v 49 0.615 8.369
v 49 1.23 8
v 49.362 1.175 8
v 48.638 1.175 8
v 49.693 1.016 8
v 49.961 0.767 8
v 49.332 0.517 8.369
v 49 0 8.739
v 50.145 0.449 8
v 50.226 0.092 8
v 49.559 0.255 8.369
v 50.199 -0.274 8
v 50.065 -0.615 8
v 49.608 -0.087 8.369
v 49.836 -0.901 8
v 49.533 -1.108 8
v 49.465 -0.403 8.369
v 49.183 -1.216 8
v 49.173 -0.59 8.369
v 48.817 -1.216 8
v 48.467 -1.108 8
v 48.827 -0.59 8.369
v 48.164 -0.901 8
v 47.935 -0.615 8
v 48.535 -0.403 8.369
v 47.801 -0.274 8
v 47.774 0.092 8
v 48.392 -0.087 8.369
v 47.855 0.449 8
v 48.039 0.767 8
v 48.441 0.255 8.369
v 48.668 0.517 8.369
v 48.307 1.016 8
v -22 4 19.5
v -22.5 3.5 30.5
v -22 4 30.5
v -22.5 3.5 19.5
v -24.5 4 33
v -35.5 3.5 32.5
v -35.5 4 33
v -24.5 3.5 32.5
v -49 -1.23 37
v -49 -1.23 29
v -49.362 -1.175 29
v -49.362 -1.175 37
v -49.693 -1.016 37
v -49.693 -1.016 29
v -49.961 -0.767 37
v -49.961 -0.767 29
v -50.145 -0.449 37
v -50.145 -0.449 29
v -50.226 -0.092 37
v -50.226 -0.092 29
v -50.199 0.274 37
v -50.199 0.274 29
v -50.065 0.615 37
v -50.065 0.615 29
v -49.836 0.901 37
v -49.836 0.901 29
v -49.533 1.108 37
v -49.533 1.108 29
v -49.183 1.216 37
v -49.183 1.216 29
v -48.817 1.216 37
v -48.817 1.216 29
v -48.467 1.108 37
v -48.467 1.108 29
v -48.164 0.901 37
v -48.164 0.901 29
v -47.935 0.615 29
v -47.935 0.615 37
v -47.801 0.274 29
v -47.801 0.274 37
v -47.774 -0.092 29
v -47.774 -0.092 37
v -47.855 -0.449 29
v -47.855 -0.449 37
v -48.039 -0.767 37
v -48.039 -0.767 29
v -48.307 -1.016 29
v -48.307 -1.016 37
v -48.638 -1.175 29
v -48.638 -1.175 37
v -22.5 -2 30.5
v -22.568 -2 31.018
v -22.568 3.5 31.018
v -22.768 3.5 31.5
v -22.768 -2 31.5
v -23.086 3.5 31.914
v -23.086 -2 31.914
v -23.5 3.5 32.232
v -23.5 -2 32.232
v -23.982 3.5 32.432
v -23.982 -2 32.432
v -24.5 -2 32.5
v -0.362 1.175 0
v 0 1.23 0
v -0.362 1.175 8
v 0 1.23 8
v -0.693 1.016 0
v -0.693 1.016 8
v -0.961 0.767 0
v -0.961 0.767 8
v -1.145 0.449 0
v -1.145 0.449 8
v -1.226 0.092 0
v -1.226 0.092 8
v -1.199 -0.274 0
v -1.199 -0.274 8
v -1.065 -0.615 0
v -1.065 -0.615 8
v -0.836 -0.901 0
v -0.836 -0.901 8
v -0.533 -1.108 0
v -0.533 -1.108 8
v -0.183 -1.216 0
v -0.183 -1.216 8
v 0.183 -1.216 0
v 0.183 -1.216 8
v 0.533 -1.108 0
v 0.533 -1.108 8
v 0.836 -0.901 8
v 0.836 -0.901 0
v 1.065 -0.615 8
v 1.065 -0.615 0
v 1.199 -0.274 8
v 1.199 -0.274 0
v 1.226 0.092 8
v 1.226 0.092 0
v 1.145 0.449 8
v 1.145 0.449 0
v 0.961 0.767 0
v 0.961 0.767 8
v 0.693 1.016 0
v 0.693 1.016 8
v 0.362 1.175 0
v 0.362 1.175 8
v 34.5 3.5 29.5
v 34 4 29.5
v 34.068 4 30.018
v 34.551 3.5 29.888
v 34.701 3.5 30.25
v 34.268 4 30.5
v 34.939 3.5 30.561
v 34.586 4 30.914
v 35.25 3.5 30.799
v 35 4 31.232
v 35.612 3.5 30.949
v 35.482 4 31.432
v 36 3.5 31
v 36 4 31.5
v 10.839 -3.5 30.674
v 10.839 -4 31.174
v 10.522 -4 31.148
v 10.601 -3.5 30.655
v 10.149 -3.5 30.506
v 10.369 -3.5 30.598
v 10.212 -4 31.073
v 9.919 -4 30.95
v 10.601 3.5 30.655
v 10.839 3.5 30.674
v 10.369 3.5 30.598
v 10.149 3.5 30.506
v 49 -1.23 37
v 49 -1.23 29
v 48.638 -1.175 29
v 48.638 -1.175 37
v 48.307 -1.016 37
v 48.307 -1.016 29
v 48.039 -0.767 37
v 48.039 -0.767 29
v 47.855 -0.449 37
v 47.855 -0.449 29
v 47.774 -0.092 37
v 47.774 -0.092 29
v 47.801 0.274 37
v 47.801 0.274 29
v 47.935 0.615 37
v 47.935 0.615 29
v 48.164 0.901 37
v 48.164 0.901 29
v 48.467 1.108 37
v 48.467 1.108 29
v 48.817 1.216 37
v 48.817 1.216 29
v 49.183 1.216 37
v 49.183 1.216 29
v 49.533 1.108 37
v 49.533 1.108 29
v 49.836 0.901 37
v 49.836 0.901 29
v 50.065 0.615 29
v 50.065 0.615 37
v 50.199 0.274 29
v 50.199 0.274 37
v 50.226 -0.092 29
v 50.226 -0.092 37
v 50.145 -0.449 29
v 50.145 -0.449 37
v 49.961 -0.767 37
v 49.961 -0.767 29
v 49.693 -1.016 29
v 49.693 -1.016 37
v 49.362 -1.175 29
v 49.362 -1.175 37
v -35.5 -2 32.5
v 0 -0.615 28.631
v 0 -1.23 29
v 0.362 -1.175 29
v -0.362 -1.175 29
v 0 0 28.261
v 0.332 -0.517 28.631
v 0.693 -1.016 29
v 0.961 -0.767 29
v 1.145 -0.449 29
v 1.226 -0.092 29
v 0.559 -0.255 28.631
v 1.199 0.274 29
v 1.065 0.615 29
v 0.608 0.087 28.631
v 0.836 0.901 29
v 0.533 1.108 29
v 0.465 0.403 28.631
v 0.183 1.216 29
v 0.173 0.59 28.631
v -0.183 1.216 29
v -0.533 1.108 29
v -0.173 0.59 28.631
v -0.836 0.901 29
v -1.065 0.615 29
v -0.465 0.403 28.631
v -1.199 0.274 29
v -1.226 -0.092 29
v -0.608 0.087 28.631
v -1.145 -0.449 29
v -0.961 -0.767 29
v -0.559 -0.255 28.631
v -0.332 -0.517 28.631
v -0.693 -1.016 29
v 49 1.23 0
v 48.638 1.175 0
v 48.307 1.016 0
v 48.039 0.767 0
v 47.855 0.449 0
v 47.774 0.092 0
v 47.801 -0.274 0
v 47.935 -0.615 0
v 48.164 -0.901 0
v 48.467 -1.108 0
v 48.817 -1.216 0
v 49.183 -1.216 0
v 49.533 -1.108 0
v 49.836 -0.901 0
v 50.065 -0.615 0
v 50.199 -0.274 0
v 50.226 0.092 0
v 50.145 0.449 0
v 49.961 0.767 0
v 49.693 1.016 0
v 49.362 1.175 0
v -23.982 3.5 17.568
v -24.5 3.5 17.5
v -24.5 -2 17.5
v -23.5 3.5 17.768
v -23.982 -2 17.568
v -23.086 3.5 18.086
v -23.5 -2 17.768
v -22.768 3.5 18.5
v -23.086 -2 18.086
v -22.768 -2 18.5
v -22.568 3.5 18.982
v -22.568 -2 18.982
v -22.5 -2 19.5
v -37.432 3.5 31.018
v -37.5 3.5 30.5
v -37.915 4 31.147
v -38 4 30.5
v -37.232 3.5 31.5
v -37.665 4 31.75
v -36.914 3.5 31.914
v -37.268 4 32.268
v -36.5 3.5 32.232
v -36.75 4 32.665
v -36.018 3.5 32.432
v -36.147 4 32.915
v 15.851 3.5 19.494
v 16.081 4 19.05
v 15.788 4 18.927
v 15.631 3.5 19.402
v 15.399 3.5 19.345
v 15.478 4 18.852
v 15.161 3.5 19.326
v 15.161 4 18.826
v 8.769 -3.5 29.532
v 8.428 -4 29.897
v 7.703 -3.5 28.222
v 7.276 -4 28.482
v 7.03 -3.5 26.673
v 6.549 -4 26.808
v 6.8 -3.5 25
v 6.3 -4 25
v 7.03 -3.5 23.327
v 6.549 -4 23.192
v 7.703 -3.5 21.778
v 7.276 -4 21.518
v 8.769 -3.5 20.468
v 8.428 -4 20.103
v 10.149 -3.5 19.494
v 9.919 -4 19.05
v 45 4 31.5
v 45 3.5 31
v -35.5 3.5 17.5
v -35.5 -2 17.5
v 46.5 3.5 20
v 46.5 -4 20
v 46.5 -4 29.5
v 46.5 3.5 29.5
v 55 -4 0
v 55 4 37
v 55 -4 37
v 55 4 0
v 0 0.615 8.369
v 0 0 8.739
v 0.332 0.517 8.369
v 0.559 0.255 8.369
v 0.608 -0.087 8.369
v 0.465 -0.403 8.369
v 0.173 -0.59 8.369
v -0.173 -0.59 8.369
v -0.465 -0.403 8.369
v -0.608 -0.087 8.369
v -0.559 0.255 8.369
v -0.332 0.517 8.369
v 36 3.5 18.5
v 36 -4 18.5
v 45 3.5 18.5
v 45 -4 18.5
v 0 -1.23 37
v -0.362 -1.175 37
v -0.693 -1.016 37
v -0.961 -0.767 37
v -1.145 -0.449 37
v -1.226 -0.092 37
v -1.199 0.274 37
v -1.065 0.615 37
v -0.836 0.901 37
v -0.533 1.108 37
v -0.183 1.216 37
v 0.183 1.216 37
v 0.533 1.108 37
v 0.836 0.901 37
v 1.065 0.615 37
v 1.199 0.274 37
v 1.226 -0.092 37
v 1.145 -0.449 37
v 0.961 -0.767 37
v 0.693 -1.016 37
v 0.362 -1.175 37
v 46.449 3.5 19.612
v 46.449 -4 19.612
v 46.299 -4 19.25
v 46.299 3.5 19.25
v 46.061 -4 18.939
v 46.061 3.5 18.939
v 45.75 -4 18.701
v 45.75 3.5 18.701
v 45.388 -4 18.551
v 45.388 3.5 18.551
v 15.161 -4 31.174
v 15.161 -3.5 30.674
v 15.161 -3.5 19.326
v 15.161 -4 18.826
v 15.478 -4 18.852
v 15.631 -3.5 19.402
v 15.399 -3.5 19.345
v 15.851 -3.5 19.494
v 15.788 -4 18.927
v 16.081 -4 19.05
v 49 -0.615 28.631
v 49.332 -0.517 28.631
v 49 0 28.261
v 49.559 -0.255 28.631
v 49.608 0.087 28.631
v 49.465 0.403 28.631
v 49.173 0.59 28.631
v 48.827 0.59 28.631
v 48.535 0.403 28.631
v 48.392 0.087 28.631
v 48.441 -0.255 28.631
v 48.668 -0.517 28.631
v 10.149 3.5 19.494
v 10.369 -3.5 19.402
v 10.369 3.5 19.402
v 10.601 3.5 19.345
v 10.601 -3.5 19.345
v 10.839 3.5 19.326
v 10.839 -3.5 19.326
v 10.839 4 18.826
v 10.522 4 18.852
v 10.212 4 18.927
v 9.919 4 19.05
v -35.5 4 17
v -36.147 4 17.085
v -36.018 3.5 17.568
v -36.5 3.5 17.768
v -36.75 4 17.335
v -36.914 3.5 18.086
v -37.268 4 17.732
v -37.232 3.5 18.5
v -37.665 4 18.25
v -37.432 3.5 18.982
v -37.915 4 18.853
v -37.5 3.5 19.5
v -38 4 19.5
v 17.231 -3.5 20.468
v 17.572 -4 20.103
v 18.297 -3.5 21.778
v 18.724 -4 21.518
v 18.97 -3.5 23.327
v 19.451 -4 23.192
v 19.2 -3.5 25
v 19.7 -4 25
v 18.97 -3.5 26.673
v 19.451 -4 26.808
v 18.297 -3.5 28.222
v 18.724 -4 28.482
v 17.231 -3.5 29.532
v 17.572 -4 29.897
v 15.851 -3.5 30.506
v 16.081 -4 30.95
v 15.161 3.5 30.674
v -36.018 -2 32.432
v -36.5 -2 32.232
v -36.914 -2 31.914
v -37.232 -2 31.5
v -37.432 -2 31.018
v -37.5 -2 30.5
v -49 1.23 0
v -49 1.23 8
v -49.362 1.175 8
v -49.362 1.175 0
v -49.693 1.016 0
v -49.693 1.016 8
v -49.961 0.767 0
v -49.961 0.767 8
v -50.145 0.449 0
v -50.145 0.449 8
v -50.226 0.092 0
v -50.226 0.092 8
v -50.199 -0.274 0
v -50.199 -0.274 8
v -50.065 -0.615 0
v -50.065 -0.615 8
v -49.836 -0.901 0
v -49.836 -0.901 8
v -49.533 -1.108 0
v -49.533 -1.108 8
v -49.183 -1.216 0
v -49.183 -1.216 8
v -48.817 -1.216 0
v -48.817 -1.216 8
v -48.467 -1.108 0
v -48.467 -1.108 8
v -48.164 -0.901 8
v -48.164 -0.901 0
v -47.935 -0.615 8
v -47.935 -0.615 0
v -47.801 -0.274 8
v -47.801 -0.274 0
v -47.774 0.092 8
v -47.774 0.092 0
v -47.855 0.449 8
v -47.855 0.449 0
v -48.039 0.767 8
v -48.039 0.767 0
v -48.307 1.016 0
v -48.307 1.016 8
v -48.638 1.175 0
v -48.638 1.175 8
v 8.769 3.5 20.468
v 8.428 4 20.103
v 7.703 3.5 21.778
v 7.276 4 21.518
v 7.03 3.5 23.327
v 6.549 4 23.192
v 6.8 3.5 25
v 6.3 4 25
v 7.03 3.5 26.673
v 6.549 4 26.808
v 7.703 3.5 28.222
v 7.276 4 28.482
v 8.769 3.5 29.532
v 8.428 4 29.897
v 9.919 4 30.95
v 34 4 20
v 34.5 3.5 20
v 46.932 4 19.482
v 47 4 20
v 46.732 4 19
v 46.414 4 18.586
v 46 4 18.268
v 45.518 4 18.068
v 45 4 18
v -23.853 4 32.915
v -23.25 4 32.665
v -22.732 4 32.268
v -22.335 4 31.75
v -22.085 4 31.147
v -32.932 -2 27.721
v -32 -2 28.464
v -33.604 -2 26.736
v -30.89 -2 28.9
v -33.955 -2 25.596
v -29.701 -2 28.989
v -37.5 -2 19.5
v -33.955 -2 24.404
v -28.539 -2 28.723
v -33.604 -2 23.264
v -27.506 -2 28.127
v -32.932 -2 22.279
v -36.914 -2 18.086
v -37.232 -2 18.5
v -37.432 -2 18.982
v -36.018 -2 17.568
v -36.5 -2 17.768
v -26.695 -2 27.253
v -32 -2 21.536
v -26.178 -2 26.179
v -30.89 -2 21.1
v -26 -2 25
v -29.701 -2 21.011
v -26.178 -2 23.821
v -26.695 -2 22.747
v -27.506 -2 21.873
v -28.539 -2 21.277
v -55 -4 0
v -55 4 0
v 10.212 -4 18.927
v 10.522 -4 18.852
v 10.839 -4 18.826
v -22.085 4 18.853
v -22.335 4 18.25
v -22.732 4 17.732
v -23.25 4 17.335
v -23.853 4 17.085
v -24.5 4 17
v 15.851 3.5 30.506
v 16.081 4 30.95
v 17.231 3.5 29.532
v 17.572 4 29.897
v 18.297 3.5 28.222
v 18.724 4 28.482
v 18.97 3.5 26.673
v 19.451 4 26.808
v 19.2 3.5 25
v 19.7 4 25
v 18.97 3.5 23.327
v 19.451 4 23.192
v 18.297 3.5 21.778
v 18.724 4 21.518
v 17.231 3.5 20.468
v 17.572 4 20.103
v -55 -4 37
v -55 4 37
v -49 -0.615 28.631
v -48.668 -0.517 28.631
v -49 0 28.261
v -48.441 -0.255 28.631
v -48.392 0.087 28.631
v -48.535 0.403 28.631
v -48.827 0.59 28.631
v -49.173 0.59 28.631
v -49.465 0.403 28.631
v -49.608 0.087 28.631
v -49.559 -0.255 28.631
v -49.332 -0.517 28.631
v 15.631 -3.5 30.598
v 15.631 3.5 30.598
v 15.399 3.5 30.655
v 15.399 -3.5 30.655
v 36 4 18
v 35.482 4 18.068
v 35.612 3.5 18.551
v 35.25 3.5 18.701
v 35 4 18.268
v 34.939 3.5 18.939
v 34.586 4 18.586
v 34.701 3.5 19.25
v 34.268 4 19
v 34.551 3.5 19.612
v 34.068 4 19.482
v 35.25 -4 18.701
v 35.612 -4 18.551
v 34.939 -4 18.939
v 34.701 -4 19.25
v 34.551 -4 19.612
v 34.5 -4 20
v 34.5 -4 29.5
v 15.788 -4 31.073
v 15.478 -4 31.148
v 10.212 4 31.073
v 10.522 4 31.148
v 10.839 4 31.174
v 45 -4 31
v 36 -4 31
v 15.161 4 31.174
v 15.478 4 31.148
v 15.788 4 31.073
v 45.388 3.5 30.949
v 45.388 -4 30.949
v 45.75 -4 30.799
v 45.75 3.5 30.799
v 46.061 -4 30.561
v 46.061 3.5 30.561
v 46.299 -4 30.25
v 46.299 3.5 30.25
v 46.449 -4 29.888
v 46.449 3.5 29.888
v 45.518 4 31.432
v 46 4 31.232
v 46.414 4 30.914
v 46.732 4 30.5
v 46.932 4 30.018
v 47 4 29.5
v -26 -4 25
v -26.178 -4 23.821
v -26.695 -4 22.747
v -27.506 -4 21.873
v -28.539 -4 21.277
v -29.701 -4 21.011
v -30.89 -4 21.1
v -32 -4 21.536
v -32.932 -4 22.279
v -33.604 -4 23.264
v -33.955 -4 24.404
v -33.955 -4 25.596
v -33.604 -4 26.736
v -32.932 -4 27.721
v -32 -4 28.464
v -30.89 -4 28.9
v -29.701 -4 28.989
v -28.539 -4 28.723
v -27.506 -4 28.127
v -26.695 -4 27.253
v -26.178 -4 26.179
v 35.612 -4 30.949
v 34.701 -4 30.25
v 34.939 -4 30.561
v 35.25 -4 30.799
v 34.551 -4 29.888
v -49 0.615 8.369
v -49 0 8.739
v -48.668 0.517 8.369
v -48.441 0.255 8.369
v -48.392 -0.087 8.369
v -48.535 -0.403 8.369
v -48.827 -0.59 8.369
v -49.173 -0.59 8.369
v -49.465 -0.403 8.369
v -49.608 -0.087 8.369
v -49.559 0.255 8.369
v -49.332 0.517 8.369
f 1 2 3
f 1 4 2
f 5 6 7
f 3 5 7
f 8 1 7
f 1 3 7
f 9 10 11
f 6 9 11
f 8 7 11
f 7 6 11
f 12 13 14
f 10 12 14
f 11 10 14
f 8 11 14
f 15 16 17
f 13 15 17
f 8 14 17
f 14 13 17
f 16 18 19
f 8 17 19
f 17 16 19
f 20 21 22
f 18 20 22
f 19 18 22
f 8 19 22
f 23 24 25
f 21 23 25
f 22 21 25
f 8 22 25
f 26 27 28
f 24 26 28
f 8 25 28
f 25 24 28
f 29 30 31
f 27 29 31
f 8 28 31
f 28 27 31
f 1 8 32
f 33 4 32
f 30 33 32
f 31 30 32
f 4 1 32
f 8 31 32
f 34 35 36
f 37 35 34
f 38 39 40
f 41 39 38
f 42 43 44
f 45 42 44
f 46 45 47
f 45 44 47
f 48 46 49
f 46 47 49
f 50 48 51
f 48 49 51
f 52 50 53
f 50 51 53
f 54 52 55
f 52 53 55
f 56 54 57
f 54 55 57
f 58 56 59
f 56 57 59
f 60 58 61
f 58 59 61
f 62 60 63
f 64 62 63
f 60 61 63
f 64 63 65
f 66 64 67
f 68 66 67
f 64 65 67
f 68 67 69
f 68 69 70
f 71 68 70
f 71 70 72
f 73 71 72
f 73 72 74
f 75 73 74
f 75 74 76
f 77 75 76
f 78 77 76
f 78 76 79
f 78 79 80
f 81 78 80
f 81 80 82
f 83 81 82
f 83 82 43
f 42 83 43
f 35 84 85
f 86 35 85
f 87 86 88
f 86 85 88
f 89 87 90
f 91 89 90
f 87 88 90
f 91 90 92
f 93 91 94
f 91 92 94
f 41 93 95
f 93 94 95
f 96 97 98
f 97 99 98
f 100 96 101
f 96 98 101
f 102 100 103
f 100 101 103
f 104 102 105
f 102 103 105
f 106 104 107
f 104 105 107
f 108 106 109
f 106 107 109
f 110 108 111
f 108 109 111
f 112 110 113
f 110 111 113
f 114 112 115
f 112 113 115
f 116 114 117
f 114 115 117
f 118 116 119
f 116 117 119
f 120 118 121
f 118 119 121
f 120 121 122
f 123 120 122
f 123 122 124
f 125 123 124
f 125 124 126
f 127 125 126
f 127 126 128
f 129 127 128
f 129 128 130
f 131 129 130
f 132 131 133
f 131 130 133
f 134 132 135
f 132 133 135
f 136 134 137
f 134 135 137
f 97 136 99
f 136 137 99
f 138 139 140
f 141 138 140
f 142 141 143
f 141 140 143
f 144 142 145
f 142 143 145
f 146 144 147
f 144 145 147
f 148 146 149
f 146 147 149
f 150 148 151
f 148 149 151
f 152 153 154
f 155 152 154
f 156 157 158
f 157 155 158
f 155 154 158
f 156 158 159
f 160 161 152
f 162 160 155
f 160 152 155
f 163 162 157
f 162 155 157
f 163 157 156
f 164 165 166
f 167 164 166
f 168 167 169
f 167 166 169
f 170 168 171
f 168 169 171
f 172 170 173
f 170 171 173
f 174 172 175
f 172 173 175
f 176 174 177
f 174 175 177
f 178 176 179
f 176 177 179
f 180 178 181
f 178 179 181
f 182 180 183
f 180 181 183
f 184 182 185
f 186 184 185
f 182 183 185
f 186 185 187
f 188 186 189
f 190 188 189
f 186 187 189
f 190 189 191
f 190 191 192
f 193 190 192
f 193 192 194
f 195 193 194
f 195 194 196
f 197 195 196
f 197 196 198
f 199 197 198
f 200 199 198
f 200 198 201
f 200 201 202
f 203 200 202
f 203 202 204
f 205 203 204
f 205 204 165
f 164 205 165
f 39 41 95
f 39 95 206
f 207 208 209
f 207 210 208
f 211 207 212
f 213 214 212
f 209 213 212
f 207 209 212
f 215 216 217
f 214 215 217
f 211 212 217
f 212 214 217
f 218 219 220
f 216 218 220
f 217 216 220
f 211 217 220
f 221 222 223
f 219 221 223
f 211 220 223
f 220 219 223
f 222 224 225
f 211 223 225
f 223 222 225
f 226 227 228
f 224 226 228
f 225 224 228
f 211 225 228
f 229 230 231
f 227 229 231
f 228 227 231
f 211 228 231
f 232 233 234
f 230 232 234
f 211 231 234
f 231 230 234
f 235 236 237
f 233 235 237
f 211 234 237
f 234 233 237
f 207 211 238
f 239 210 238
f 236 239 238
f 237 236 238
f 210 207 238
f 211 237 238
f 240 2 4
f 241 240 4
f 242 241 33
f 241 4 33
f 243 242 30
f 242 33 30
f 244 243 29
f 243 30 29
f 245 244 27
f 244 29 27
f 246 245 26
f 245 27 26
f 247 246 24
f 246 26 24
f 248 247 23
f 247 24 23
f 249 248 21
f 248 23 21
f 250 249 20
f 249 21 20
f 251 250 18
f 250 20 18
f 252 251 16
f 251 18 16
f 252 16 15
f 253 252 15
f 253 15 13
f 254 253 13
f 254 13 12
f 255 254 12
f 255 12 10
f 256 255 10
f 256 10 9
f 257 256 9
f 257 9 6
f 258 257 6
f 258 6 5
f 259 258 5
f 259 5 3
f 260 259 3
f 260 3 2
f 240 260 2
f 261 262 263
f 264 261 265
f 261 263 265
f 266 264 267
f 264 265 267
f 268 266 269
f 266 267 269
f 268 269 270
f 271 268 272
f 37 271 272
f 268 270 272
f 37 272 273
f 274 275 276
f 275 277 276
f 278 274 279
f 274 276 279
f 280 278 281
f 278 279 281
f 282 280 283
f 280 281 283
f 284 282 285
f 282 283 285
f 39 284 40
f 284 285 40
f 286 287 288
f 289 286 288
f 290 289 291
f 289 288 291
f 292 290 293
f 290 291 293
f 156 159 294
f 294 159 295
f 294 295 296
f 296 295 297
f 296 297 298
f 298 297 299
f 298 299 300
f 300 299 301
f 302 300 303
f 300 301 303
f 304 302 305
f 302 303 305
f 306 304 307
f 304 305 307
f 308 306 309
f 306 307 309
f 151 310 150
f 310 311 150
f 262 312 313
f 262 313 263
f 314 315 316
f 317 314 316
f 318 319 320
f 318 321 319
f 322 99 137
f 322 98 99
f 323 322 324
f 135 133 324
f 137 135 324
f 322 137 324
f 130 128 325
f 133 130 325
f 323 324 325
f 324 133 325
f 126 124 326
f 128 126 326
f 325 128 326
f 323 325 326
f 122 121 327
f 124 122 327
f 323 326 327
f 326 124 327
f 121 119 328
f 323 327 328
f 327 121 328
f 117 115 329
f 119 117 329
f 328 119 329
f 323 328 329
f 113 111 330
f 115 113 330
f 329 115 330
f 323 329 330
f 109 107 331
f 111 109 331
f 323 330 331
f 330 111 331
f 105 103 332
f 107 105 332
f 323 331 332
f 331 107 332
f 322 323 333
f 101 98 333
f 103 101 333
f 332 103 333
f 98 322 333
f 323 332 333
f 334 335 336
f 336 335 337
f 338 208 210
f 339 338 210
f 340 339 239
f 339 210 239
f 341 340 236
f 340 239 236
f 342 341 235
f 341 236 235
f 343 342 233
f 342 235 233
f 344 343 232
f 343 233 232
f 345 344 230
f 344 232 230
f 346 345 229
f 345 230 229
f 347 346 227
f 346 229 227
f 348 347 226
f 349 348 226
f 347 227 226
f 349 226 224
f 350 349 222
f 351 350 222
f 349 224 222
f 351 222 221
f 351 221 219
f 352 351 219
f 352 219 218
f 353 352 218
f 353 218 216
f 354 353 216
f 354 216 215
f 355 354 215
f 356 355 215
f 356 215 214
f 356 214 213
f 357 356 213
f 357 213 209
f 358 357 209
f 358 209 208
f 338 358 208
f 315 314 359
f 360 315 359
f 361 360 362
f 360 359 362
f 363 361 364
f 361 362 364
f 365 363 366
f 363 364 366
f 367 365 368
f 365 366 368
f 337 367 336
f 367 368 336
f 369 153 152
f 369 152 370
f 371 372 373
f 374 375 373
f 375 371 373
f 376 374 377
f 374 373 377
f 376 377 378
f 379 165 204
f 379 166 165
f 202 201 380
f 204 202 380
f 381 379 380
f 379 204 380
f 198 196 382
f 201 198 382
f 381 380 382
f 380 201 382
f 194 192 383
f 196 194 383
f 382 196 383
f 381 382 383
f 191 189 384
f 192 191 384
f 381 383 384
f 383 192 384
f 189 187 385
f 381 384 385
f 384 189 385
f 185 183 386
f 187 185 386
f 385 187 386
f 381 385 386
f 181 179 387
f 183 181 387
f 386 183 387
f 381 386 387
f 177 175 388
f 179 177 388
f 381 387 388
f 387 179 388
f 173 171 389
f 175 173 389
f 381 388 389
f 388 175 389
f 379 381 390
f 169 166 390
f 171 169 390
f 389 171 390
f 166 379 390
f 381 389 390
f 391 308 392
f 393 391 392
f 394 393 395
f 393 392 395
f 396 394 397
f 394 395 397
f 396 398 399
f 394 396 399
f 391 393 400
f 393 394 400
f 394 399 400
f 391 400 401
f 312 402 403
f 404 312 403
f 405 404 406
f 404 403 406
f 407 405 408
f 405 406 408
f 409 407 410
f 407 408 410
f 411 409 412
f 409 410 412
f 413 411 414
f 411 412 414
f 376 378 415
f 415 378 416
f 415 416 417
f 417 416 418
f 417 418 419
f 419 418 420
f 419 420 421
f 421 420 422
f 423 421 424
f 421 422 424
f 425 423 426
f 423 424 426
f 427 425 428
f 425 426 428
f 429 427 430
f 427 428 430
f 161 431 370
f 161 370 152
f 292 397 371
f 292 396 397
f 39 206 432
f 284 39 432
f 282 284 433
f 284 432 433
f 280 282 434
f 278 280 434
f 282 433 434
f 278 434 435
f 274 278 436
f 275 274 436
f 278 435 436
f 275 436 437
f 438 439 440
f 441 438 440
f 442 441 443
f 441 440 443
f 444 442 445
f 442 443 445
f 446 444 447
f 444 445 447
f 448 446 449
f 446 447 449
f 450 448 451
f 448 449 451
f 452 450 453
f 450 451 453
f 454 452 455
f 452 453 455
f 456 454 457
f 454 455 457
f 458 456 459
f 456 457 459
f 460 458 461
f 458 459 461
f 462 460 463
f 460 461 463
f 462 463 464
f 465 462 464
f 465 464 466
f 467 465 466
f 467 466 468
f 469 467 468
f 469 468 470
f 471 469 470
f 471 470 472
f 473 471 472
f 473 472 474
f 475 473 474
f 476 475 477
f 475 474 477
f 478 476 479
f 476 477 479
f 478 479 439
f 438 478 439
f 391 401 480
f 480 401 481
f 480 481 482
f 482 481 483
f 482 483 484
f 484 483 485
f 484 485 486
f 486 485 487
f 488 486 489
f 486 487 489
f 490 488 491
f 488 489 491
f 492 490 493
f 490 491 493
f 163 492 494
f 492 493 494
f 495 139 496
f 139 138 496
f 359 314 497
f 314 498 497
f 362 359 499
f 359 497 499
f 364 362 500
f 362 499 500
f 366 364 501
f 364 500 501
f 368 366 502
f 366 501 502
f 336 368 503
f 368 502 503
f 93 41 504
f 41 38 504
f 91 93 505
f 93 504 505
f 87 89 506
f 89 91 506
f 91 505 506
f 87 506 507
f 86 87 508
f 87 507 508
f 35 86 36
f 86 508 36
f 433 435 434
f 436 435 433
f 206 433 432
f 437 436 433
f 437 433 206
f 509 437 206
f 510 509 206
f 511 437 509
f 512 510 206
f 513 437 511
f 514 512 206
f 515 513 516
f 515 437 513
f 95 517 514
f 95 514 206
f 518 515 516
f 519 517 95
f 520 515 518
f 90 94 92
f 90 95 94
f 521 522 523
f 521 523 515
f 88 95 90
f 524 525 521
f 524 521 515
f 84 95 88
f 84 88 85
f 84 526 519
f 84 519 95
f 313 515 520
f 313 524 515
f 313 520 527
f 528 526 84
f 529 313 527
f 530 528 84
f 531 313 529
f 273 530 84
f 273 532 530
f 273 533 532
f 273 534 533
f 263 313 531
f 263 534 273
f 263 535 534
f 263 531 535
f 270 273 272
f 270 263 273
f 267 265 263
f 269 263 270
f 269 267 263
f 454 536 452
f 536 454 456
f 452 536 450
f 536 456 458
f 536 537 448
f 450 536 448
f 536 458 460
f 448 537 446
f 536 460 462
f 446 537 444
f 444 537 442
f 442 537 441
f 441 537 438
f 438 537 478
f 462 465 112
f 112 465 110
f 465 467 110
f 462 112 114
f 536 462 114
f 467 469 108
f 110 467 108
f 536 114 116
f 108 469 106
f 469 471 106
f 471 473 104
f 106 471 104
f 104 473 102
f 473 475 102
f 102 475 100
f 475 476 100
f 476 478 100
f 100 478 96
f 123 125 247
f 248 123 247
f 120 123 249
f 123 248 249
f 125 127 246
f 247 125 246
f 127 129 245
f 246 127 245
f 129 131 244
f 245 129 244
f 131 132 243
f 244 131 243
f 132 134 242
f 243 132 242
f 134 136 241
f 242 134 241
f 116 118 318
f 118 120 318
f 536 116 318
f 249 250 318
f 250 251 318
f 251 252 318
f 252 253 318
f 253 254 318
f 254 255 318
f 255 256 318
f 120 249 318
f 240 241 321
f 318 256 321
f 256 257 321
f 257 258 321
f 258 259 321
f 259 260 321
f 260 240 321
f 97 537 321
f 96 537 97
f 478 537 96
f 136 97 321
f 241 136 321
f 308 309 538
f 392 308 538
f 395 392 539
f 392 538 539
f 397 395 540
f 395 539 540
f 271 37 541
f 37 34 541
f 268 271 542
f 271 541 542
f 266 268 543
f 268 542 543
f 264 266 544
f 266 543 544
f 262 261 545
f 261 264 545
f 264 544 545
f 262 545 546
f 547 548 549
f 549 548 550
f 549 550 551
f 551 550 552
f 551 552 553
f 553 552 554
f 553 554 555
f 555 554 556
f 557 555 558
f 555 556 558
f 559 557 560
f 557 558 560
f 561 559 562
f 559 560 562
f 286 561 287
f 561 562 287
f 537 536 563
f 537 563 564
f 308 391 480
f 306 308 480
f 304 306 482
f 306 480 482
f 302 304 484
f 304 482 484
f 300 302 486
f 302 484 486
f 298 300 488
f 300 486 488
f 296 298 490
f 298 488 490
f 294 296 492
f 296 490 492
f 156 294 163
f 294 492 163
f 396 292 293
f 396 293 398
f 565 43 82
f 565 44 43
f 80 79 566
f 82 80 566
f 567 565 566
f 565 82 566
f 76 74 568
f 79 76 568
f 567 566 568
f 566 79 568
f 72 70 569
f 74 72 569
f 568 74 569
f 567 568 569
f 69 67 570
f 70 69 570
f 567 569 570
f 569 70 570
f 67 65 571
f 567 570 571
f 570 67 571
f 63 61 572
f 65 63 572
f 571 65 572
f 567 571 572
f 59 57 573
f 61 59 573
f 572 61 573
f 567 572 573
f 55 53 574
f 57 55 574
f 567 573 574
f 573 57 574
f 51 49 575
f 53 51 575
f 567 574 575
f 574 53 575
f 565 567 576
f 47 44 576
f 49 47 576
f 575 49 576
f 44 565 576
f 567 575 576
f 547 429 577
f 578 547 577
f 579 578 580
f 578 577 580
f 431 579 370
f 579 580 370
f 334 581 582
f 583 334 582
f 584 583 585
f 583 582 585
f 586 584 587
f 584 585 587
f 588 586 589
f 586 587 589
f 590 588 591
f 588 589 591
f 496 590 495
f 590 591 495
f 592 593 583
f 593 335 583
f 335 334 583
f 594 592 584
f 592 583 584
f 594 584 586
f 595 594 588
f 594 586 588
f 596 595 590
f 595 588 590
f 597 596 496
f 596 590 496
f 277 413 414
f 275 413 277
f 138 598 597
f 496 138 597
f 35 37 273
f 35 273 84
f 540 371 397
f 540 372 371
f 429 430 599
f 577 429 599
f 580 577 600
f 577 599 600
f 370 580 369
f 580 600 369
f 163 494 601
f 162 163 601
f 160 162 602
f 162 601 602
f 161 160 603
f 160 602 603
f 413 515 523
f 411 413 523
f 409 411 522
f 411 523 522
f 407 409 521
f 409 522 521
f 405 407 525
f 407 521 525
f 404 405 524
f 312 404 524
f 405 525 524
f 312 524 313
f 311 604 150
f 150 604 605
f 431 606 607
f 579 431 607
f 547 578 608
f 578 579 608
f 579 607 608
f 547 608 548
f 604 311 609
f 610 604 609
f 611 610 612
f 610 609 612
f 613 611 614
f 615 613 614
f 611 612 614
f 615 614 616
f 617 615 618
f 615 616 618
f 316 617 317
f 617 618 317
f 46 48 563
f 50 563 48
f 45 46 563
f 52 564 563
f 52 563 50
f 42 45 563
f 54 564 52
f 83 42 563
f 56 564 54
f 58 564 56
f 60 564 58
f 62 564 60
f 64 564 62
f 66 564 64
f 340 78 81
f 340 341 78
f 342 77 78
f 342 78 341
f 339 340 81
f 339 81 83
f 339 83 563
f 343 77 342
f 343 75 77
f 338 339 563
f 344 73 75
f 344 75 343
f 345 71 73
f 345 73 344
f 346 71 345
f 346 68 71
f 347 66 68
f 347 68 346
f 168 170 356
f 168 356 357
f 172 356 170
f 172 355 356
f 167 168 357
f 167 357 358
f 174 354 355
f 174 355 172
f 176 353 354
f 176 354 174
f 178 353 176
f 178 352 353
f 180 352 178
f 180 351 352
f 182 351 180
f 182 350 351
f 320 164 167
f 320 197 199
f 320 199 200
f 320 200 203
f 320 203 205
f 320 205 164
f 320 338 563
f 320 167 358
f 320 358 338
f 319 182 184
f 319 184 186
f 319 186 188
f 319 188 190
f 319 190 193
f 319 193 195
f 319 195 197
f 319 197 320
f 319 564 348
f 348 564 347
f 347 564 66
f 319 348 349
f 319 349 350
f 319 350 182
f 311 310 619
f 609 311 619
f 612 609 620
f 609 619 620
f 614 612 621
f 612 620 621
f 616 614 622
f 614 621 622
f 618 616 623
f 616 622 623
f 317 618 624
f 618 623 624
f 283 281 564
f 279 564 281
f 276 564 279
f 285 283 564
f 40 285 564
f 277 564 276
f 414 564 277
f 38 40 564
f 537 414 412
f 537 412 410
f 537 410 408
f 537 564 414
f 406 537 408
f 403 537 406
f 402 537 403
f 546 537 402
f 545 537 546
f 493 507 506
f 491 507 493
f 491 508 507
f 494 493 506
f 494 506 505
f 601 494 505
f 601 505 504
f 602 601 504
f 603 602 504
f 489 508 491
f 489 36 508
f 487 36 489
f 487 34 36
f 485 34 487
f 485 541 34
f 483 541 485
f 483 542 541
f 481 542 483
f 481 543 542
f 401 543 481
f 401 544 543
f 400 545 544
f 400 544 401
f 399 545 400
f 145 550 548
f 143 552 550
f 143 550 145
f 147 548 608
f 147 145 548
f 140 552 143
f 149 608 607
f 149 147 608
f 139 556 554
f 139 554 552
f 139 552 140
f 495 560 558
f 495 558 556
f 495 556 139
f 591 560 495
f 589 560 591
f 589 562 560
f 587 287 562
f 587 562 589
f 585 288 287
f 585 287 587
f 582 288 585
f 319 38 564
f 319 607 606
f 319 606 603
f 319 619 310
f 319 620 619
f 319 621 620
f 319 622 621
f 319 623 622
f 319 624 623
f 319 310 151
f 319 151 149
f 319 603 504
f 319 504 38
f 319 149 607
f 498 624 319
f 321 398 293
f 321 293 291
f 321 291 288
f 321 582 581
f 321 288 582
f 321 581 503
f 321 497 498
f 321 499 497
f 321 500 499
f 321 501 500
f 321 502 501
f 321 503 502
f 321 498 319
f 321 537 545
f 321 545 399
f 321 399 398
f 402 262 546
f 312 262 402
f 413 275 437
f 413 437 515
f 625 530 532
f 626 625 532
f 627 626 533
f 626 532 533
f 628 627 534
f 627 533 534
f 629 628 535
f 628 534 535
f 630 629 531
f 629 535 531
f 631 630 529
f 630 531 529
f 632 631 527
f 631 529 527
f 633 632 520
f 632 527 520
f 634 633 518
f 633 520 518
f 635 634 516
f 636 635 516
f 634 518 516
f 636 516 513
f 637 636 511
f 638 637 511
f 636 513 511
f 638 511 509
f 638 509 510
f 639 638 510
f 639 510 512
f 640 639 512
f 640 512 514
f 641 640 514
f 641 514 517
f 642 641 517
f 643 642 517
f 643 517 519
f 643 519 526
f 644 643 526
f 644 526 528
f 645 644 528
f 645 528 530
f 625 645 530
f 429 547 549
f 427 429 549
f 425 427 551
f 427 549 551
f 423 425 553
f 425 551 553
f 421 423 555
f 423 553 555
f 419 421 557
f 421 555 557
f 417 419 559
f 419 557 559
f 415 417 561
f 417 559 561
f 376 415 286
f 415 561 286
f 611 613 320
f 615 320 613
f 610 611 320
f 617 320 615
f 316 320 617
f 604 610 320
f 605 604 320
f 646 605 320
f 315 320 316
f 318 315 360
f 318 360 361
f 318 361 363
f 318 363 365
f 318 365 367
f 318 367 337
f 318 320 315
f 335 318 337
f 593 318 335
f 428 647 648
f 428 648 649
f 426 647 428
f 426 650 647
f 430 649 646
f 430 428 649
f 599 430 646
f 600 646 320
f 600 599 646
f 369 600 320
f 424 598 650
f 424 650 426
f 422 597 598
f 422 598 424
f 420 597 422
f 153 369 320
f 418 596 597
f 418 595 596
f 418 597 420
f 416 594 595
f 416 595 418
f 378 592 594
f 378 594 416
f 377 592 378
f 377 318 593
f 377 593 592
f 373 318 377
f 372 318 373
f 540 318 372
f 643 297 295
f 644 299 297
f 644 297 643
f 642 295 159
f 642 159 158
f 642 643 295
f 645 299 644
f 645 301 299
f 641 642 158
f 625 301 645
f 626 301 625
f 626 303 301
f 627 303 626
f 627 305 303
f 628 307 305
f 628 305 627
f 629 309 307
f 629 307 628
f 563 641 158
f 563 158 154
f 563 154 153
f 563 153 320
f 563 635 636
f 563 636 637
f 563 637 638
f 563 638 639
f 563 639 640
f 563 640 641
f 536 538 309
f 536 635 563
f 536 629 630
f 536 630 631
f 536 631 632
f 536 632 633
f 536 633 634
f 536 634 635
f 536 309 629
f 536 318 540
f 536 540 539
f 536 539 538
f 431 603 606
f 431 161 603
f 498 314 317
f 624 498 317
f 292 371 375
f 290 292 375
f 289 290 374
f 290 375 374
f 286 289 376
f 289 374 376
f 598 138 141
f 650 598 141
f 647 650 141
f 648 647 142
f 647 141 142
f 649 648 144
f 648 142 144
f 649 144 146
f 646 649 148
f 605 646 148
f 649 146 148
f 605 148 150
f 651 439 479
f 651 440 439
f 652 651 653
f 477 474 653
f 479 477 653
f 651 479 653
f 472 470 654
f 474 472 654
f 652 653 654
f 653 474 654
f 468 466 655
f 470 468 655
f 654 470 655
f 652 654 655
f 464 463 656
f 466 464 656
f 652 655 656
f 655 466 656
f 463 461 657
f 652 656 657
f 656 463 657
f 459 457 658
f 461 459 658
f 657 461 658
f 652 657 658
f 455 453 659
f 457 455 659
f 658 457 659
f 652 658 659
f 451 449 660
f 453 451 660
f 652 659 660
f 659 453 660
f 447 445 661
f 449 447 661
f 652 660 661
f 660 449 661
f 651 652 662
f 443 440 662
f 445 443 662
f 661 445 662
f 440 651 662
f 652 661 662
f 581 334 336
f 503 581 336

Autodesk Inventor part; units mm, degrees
ref_plane "YZ Plane" through (0, 0, 0) normal (1, 0, 0) x (0, 1, 0)
ref_plane "XZ Plane" through (0, 0, 0) normal (0, 1, 0) x (-1, 0, 0)
ref_plane "XY Plane" through (0, 0, 0) normal (0, 0, 1) x (1, 0, 0)
sketch "Sketch1" plane through (0, 0, 0) normal (0, 0, 1) x (1, 0, 0)
  line L0 (-55, 4) -> (55, 4)
  line L1 (55, 4) -> (55, -4)
  line L2 (55, -4) -> (-55, -4)
  line L3 (-55, -4) -> (-55, 4)
  line L4 (-55, 4) -> (55, -4) construction
  line L5 (55, 4) -> (-55, -4) construction
  point P0 (0, 0)
  dimension "d0" = 110
  dimension "d1" = 8
extrude "Extrusion1" add sketch "Sketch1" along normal blind 37
sketch "Sketch2" plane through (0, 0, 37) normal (0, 0, 1) x (1, 0, 0)
  line L0 (-55, 4) -> (-55, -4) projected
  line L1 (55, -4) -> (55, 4) projected
  point P0 (0, 0)
  point P1 (-49, 0)
  point P2 (0, 0)
  point P3 (49, 0)
  dimension "d4" = 6
  dimension "d5" = 6
hole "Hole1" at (-49, 0, 37) at (0, 0, 37) at (49, 0, 37) direction (0, 0, -1) diameter 2.459 depth 8 tip angle 118 thread size "M3x0.5" class "6H" standard "ISO Metric profile"
fillet "Fillet1" [suppressed]
sketch "Sketch3" plane through (0, 0, 0) normal (0, 0, -1) x (-1, 0, 0)
  circle A0 centre (-49, 0) radius 1.2295 projected
  circle A1 centre (0, 0) radius 1.2295 projected
  circle A2 centre (49, 0) radius 1.2295 projected
hole "Hole2" at (49, 0, 0) at (0, 0, 0) at (-49, 0, 0) direction (0, 0, 1) diameter 2.459 depth 8 tip angle 118 thread size "M3x0.5" class "6H" standard "ISO Metric profile"
sketch "Sketch6" plane through (-55, -4, 0) normal (0, -1, 0) x (1, 0, 0)
  line L0 (89.5, 18.5) -> (101.5, 18.5)
  line L1 (101.5, 18.5) -> (101.5, 31)
  line L2 (101.5, 31) -> (89.5, 31)
  line L3 (89.5, 31) -> (89.5, 18.5)
  line L4 (110, 0) -> (110, 37) projected
  line L5 (110, 0) -> (0, 0) projected
  line L6 (0, 37) -> (110, 37) projected
  point P0 (55, 0)
  dimension "d34" = 8.5
  dimension "d35" = 12
  dimension "d61" = 6
  dimension "d62" = 12.5
extrude "Extrusion3" cut sketch "Sketch6" against normal blind 10
fillet "Fillet2" radius 1.5 4 edges at (34.5, 0, 31) (46.5, 0, 31) (46.5, 0, 18.5) (34.5, 0, 18.5)
sketch "Sketch7" plane through (-55, 4, 0) normal (0, 1, 0) x (1, 0, 0)
  circle A0 centre (25, -25) radius 4
  line L0 (110, -37) -> (0, -37) projected
  line L1 (110, 0) -> (110, -37) projected
  point P0 (55, 0)
  dimension "d44" = 8
  dimension "d45" = 12
  dimension "d46" = 85
extrude "Extrusion4" cut sketch "Sketch7" against normal blind 10
sketch "Sketch9" plane through (-55, 4, 0) normal (0, 1, 0) x (1, 0, 0)
  line L0 (32.5, -32.5) -> (17.5, -32.5)
  line L1 (17.5, -32.5) -> (17.5, -17.5)
  line L2 (17.5, -17.5) -> (32.5, -17.5)
  line L3 (32.5, -17.5) -> (32.5, -32.5)
  circle A0 centre (25, -25) radius 4 projected
  line L4 (32.5, -32.5) -> (17.5, -17.5) construction
  line L5 (17.5, -32.5) -> (32.5, -17.5) construction
  point P0 (55, 0)
  dimension "d52" = 15
  dimension "d53" = 15
extrude "Extrusion6" cut sketch "Sketch9" against normal blind 6
fillet "Fillet3" radius 2 4 edges at (-22.5, 1, 32.5) (-22.5, 1, 17.5) (-37.5, 1, 17.5) (-37.5, 1, 32.5)
chamfer "Chamfer3" distance 0.5 angle 45 16 edges at (40.5, 4, 31) (34.9393, 4, 30.5607) (34.5, 4, 24.75) (34.9393, 4, 18.9393) (40.5, 4, 18.5) (46.0607, 4, 18.9393) (46.5, 4, 24.75) (46.0607, 4, 30.5607) (-30, 4, 17.5) (-23.0858, 4, 18.0858) (-22.5, 4, 25) (-23.0858, 4, 31.9142) (-30, 4, 32.5) (-36.9142, 4, 31.9142) (-37.5, 4, 25) (-36.9142, 4, 18.0858)
sketch "Sketch10" plane through (-55, 4, 0) normal (0, 1, 0) x (1, 0, 0)
  line L0 (110, 0) -> (110, -37) projected
  line L1 (70.5, -30.6736) -> (65.5, -30.6736)
  line L2 (65.5, -19.3264) -> (70.5, -19.3264)
  line L3 (70.5, -30.6736) -> (65.5, -19.3264) construction
  line L4 (65.5, -30.6736) -> (70.5, -19.3264) construction
  arc A0 (70.5, -30.6736) -> (70.5, -19.3264) centre (68, -25) ccw
  arc A1 (65.5, -19.3264) -> (65.5, -30.6736) centre (68, -25) ccw
  point P0 (55, 0)
  dimension "d70" = 42
  dimension "d74" = 5
extrude "Extrusion7" cut sketch "Sketch10" against normal blind 10
chamfer "Chamfer4" [suppressed]
fillet "Fillet5" radius 1.5 4 edges at (15.5, 0, 30.6736) (10.5, 0, 30.6736) (15.5, 0, 19.3264) (10.5, 0, 19.3264)
chamfer "Chamfer5" distance 0.5 angle 45 16 edges at (13, 4, 19.3264) (15.5162, 4, 19.369) (19.2, 4, 25) (15.5162, 4, 30.631) (13, 4, 30.6736) (10.4838, 4, 30.631) (6.8, 4, 25) (10.4838, 4, 19.369) (19.2, -4, 25) (15.5162, -4, 19.369) (13, -4, 19.3264) (10.4838, -4, 19.369) (6.8, -4, 25) (10.4838, -4, 30.631) (13, -4, 30.6736) (15.5162, -4, 30.631)
properties part number "back accses panel" material "Aluminum 6061"
